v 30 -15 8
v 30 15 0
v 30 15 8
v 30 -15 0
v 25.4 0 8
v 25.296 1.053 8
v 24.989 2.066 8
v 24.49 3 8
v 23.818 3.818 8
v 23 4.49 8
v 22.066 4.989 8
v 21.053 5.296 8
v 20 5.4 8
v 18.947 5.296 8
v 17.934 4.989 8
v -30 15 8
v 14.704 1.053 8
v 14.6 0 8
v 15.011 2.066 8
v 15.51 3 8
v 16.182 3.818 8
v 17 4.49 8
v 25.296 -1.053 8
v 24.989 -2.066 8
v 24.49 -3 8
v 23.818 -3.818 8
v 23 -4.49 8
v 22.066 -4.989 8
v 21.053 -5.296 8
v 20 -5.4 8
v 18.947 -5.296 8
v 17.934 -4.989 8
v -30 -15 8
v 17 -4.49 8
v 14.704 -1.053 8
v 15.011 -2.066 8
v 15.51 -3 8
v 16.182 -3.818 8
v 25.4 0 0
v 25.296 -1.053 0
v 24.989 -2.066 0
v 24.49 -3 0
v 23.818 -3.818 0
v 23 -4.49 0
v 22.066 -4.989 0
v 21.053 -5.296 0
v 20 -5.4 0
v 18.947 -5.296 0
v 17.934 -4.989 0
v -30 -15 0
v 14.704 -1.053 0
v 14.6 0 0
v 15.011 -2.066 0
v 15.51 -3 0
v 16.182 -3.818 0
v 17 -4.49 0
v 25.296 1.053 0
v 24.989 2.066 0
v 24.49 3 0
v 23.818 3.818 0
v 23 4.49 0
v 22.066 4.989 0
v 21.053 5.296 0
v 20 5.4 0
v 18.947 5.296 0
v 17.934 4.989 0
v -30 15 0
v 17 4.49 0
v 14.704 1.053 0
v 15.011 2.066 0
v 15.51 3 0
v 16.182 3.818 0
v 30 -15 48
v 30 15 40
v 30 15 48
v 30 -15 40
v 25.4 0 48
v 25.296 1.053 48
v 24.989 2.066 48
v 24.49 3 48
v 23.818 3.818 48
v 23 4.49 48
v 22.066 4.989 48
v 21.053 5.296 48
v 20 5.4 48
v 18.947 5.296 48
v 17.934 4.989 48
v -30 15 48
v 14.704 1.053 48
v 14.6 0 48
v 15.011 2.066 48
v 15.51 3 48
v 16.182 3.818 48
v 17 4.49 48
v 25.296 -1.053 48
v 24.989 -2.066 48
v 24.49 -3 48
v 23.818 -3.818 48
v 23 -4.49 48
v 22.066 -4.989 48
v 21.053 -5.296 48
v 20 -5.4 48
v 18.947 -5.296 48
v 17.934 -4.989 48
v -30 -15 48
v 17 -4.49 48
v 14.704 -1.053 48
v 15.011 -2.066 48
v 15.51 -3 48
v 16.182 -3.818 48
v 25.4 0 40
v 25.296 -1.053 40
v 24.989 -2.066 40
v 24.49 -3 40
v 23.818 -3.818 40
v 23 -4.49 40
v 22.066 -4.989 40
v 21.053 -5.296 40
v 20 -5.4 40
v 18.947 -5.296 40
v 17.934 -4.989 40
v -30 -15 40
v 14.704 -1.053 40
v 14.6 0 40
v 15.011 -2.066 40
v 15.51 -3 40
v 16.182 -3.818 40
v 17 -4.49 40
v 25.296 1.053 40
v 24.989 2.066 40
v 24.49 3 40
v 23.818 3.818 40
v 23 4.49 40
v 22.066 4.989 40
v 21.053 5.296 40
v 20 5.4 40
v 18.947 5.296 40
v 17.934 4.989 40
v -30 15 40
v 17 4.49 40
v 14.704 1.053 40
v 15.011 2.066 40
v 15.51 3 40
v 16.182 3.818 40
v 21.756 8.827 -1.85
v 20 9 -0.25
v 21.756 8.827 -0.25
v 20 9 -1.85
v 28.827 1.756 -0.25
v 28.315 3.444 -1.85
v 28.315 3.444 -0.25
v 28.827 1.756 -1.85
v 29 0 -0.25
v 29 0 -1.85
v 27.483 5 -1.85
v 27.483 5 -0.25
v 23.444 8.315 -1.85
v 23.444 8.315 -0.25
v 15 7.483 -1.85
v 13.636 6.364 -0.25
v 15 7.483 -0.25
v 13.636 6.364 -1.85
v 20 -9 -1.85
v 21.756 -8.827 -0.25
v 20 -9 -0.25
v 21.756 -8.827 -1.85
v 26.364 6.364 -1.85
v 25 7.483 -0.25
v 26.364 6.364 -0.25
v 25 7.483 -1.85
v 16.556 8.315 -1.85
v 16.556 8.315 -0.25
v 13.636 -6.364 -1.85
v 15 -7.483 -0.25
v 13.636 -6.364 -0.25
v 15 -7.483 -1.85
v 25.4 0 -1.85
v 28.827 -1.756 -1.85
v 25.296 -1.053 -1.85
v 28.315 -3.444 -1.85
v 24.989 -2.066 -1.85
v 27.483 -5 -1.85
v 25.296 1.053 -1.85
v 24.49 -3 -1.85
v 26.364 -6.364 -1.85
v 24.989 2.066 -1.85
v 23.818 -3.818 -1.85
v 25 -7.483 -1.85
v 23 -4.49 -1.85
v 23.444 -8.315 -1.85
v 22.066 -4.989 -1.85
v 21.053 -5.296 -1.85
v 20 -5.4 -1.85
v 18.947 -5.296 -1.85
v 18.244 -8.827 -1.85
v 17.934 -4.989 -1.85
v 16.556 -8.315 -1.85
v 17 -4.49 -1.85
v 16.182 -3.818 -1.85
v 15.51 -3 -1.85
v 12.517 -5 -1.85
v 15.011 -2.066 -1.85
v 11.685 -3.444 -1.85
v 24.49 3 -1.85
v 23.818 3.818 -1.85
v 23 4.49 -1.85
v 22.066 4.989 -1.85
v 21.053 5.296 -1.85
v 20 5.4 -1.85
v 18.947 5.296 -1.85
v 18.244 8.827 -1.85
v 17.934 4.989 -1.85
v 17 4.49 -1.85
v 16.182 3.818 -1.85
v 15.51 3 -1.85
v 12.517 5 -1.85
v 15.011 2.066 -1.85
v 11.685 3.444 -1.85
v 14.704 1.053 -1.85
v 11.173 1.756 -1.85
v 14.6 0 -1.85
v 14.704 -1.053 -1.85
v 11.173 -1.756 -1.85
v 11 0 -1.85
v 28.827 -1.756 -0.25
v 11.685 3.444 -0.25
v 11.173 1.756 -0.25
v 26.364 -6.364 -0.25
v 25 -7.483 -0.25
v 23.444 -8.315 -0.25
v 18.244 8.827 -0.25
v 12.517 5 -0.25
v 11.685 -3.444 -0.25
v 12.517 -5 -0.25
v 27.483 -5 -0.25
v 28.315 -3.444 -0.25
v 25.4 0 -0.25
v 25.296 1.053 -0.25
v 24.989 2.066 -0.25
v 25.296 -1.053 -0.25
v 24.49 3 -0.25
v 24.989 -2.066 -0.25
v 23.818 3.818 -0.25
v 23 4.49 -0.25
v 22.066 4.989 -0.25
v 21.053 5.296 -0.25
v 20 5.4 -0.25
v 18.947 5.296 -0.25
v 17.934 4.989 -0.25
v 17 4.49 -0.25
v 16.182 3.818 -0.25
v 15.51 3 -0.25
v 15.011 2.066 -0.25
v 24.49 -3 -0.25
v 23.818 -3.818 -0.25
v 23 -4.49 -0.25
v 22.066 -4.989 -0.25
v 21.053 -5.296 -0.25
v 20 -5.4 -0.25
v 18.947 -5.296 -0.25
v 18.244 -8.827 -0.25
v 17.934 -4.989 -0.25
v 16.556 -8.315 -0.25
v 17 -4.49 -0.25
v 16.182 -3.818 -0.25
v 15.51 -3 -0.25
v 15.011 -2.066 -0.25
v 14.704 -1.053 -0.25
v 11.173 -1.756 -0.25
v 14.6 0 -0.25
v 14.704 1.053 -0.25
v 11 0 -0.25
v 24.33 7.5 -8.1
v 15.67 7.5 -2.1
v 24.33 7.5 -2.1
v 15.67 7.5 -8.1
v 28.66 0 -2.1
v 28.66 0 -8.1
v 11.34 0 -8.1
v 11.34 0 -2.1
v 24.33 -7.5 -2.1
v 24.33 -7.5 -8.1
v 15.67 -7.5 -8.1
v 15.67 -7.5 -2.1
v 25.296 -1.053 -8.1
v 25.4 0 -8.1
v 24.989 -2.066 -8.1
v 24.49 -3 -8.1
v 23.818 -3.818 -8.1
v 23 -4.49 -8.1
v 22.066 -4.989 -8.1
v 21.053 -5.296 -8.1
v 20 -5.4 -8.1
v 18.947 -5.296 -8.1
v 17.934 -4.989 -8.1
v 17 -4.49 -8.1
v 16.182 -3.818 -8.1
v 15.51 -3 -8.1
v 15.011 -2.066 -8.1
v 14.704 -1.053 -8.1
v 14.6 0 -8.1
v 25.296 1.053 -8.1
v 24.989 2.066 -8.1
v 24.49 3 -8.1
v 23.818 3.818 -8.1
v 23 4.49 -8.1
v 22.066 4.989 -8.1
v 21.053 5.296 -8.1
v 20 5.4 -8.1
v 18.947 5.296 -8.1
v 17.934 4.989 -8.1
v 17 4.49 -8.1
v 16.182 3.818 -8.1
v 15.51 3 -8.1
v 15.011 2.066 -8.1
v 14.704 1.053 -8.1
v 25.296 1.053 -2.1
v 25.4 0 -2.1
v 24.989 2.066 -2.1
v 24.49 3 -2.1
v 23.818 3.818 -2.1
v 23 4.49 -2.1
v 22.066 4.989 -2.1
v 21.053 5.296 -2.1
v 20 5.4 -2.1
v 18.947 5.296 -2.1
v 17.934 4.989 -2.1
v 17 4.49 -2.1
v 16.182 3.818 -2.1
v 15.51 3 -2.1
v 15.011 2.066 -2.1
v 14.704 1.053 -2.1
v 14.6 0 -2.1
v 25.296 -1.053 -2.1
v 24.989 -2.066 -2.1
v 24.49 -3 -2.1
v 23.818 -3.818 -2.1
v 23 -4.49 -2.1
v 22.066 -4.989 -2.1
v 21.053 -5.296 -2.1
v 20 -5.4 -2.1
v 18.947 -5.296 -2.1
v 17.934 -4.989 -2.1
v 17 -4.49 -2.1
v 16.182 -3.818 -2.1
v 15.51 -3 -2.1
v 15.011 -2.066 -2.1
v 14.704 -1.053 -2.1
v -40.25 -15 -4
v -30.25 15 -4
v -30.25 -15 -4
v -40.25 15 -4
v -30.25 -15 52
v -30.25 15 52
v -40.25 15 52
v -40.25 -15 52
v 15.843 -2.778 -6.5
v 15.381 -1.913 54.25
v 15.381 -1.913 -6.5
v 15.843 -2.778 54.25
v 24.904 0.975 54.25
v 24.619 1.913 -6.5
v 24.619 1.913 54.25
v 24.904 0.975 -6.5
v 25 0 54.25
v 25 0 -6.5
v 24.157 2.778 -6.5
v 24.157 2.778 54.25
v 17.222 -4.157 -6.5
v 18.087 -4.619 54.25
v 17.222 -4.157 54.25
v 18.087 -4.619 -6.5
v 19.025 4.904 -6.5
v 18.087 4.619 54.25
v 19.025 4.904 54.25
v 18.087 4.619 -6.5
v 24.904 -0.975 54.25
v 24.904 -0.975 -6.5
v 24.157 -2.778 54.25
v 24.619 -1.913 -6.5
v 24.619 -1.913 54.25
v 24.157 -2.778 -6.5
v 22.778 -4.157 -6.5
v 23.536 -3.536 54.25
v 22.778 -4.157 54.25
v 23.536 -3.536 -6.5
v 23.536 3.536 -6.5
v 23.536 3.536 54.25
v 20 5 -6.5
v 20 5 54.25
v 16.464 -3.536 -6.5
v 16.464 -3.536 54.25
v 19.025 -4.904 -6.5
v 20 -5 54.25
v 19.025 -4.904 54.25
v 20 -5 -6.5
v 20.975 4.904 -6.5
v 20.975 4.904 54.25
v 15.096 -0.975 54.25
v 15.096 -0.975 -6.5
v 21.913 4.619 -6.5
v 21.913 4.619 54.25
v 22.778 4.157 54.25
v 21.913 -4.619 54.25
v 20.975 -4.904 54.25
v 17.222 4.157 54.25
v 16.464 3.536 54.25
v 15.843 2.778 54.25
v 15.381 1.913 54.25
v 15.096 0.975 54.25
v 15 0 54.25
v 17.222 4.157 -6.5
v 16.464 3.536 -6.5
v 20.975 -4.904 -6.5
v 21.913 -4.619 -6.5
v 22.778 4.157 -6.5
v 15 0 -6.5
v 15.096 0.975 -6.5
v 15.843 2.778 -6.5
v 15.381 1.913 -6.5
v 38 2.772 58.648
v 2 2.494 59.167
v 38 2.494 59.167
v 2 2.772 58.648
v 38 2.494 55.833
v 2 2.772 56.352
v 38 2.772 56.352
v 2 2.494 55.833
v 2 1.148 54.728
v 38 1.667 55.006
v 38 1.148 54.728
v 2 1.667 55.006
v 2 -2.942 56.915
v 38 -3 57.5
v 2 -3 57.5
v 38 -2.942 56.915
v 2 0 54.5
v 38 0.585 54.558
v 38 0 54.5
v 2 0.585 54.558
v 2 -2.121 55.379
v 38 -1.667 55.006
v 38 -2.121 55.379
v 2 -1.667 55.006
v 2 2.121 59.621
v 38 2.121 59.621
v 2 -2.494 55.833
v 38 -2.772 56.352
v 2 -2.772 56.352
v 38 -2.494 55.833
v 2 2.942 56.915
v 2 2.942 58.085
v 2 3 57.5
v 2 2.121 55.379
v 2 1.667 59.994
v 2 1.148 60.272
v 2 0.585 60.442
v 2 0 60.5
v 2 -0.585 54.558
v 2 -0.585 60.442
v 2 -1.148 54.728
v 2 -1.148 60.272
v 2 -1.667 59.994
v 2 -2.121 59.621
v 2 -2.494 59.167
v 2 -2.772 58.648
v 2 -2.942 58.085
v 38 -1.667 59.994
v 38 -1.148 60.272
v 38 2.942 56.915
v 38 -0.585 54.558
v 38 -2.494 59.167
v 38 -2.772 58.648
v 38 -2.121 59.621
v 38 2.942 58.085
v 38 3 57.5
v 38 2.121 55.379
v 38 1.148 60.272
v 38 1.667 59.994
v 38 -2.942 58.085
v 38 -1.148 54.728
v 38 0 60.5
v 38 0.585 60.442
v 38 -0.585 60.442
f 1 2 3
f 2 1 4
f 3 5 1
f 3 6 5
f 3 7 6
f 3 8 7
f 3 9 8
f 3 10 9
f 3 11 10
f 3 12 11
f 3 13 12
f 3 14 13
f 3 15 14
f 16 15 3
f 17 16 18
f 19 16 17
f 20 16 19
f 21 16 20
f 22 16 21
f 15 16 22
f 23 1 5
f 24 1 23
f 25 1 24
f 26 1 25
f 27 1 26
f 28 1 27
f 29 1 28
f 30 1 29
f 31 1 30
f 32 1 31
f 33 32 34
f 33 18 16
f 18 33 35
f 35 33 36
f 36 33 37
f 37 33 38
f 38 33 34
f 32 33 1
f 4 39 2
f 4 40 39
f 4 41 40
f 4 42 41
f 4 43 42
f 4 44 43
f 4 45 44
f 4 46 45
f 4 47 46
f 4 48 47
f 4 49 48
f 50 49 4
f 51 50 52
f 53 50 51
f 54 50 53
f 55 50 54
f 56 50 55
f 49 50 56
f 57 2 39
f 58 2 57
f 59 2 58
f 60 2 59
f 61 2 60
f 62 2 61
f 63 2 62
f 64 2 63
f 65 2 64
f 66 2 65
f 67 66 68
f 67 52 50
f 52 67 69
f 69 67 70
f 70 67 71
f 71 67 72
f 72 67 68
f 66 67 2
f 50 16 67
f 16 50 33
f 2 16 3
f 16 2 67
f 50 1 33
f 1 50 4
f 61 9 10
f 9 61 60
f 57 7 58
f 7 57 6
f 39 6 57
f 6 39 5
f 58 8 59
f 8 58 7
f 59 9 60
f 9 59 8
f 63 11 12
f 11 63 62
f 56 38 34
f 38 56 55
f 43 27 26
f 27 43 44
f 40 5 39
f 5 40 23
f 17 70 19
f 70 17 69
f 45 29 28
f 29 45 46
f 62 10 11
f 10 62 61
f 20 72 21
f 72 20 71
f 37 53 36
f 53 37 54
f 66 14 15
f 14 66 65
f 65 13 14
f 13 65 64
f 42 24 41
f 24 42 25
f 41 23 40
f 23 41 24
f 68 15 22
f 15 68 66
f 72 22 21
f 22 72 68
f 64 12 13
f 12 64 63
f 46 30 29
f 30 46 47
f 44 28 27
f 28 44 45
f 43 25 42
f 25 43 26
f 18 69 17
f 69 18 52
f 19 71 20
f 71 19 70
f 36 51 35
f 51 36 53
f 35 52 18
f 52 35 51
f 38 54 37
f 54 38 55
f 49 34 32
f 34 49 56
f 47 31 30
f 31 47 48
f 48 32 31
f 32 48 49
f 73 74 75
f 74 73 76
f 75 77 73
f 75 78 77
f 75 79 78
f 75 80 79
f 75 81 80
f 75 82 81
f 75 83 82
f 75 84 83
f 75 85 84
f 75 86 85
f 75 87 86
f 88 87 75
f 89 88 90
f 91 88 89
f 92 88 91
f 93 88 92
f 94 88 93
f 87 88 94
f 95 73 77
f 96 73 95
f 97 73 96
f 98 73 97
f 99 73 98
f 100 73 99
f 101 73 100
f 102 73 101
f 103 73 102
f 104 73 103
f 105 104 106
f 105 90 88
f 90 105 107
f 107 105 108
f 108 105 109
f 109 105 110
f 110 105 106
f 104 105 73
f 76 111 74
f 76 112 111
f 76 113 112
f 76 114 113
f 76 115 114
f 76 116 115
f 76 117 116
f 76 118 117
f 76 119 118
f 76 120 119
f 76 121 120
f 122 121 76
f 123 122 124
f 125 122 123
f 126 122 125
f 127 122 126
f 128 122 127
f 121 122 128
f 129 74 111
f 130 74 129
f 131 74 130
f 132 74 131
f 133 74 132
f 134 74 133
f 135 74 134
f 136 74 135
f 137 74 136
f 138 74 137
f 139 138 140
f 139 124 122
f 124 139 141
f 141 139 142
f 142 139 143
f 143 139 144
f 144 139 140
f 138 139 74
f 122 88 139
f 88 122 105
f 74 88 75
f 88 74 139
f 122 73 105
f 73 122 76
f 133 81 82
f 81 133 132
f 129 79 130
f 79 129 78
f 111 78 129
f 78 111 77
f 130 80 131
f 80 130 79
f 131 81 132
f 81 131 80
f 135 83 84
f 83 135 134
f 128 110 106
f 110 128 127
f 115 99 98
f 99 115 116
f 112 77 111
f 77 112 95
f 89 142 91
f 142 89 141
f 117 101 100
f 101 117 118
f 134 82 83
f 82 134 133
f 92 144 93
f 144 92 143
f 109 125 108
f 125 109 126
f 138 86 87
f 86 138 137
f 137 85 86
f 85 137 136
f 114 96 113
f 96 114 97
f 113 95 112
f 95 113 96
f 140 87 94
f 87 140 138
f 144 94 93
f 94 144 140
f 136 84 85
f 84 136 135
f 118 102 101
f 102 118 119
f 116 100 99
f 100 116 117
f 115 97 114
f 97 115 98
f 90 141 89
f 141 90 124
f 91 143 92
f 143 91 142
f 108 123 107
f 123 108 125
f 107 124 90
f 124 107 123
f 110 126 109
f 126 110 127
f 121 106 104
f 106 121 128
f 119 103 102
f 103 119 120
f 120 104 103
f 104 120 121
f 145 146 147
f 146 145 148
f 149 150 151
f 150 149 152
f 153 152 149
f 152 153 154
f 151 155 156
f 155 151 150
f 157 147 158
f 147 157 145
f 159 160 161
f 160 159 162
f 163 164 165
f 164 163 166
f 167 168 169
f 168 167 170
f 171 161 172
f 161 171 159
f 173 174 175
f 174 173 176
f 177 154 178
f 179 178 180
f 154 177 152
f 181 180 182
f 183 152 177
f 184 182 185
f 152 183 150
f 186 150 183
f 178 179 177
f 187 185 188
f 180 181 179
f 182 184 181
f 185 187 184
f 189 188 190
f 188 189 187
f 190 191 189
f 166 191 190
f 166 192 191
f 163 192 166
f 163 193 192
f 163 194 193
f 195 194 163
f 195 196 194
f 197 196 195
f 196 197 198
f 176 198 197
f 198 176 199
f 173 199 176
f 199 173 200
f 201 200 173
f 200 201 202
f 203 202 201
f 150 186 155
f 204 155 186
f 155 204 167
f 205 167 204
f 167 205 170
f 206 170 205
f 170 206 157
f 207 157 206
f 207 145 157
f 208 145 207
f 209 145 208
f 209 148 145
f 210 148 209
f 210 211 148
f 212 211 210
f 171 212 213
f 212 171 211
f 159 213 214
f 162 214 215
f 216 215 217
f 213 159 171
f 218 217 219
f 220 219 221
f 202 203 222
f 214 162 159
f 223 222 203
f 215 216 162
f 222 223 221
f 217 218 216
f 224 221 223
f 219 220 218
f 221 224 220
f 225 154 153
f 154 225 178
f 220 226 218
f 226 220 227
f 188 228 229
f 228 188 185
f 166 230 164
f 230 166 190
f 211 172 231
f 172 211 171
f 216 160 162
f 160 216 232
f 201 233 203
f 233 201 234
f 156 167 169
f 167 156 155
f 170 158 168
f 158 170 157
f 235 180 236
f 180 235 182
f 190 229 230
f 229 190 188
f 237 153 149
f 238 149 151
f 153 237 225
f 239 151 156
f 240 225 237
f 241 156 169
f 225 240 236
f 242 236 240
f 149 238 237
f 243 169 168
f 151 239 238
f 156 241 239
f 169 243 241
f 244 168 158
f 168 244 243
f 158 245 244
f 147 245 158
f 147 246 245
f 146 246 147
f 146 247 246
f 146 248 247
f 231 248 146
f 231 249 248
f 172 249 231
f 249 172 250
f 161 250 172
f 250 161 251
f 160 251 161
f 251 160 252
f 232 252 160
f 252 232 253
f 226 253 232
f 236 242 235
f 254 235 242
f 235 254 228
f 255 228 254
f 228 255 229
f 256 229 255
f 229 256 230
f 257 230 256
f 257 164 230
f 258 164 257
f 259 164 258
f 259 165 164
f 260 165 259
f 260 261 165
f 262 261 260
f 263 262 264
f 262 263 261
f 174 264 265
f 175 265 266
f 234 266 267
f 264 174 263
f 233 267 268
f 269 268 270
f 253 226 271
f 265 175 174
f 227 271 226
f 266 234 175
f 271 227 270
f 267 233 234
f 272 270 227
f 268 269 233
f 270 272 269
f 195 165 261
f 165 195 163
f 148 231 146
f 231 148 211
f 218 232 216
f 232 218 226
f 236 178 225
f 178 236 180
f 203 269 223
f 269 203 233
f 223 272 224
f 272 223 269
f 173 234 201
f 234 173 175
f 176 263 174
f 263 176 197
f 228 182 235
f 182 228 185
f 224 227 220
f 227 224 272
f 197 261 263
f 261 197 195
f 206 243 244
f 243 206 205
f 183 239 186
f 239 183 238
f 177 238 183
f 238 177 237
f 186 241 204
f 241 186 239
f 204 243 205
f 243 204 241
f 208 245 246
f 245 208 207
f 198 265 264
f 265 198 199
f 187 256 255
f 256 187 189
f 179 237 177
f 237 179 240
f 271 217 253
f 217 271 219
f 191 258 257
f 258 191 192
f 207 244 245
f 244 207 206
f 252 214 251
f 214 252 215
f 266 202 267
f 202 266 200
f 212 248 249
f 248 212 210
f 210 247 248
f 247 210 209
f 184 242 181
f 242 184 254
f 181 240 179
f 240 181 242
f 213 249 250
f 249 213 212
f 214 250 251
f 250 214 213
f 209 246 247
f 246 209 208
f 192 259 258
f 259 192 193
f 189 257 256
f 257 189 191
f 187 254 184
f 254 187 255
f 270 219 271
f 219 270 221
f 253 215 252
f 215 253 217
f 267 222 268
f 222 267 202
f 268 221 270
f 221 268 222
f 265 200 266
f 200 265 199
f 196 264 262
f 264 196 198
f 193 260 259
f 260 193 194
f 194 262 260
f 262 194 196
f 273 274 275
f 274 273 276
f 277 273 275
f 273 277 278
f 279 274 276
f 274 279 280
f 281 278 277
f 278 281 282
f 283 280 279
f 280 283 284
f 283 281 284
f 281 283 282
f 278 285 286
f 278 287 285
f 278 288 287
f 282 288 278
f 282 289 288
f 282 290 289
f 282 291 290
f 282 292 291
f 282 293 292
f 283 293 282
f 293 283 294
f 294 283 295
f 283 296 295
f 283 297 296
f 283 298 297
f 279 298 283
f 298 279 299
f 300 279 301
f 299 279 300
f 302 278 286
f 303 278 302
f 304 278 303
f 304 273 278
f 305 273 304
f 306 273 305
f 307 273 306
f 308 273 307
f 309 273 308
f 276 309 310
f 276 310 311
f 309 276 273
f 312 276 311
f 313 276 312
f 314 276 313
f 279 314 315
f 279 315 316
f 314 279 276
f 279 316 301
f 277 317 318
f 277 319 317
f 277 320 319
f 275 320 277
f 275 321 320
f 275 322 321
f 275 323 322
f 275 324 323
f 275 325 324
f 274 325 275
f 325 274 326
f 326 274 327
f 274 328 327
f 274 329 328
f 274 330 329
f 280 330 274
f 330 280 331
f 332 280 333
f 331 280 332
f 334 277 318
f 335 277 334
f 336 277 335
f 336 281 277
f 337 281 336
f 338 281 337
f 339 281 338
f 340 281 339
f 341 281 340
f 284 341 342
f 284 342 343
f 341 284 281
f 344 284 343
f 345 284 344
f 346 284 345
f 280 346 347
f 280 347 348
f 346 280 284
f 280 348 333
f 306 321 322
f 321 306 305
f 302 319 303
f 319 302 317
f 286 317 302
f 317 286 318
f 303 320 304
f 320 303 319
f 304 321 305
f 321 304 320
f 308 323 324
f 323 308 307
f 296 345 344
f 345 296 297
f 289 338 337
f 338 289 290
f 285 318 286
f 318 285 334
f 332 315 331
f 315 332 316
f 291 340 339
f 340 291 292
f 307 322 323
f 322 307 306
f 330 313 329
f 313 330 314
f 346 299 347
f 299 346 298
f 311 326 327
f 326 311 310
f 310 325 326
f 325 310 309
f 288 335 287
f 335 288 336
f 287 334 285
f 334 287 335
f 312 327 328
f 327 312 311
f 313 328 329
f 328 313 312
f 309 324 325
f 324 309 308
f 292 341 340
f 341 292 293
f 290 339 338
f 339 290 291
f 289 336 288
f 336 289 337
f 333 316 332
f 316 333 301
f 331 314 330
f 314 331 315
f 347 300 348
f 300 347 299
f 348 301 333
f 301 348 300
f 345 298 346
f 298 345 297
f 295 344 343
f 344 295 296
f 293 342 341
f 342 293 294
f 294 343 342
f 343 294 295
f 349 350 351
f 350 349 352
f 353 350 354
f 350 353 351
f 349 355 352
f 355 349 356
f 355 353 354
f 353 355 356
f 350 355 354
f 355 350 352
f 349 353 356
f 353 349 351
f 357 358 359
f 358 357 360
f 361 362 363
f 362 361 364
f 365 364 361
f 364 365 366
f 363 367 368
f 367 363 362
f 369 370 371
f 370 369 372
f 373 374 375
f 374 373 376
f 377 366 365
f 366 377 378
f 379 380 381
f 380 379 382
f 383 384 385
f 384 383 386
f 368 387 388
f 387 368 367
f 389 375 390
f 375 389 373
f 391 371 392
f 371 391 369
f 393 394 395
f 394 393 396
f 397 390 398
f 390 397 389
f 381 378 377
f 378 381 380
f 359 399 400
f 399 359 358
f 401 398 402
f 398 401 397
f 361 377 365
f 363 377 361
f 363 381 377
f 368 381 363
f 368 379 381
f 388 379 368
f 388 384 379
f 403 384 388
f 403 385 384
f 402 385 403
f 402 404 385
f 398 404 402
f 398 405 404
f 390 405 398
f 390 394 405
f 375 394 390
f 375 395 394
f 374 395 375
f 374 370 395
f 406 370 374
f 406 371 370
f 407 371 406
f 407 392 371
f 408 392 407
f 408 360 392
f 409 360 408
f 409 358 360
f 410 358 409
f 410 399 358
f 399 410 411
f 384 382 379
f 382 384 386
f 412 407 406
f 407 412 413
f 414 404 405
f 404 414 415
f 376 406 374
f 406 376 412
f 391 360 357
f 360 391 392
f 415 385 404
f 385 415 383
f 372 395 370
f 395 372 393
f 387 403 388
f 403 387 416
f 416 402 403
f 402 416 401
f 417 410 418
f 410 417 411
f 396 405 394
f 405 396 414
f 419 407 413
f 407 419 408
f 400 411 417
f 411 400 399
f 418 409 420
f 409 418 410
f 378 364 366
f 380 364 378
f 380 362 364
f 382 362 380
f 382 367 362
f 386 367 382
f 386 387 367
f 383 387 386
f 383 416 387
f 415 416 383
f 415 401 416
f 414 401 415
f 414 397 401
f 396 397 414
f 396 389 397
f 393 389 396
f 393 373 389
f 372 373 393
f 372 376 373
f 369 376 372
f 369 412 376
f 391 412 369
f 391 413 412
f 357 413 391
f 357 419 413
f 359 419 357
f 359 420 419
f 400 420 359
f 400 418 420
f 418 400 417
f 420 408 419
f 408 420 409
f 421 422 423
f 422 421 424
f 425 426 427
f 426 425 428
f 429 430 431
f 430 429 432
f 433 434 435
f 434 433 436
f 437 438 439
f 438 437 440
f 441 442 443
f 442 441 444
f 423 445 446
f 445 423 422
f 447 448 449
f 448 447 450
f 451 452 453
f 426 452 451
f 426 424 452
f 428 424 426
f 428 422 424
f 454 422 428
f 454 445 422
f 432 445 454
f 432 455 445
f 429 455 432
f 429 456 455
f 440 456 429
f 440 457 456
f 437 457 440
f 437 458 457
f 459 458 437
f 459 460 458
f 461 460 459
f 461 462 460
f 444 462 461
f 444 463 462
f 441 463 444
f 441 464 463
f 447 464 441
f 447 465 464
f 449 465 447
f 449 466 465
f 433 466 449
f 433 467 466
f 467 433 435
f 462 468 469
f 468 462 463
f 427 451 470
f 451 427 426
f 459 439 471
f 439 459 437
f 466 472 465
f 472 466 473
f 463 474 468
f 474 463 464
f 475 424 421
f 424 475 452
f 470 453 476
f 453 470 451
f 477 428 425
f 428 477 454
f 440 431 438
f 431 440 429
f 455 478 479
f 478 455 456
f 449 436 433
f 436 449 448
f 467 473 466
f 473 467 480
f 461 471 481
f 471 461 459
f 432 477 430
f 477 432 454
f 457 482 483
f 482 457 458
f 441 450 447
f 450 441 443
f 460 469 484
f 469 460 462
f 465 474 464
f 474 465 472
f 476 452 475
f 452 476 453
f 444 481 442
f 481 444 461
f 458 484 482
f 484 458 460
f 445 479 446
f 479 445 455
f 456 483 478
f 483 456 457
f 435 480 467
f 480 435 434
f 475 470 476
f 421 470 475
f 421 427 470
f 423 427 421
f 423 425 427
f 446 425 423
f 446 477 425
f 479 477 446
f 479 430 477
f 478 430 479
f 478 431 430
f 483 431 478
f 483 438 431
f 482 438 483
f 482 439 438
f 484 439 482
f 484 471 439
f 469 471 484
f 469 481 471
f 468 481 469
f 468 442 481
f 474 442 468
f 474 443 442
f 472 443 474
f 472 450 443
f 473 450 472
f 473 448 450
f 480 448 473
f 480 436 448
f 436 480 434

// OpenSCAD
$fn = 32;

// ------------------------------------------------------------------------
// C clamp: throat 40 mm, screw d10
// Every part is its own module, assembly() places every instance.
// ------------------------------------------------------------------------

// --- part 1 ---
module clamp_arm() {
  difference() {
    translate([-30, -15, 0]) cube([60, 30, 8]);
    translate([20, 0, -1]) cylinder(h = 10, d = 10.8);
  }
}

// --- part 2 ---
module clamp_spine() {
  difference() {
    translate([-28, -15, 0]) cube([56, 30, 10]);
  }
}

// --- part 3 ---
module clamp_screw() {
  translate([0, 0, -30.375]) cylinder(h = 60.75, d = 10);
}

// --- part 4 ---
module clamp_washer() {
  difference() {
      translate([0, 0, 0]) cylinder(h = 1.6, d = 18);
      translate([0, 0, -1]) cylinder(h = 3.6, d = 10.8);
    }
}

// --- part 5 ---
module clamp_nut() {
  difference() {
    linear_extrude(height = 6) polygon(points = [[8.66, 0], [4.33, 7.5], [-4.33, 7.5], [-8.66, 0], [-4.33, -7.5], [4.33, -7.5]]);
    translate([0, 0, -1]) cylinder(h = 8, d = 10.8);
  }
}

// --- part 6 ---
module tommy_bar() {
  translate([0, 0, -18]) cylinder(h = 36, d = 6);
}

// --- assembly ---
module assembly() {
  color([0.80, 0.24, 0.20]) translate([0, 0, 0]) rotate([0, 0, 0]) clamp_arm();
  color([0.20, 0.45, 0.75]) translate([0, 0, 40]) rotate([0, 0, 0]) clamp_arm();
  color([0.25, 0.62, 0.32]) translate([-40.25, 0, 24]) rotate([0, 90, 0]) clamp_spine();
  color([0.92, 0.70, 0.18]) translate([20, 0, 23.875]) rotate([0, 0, 0]) clamp_screw();
  color([0.58, 0.35, 0.70]) translate([20, 0, -1.85]) rotate([0, 0, 0]) clamp_washer();
  color([0.16, 0.66, 0.66]) translate([20, 0, -8.1]) rotate([0, 0, 0]) clamp_nut();
  color([0.85, 0.48, 0.18]) translate([20, 0, 57.5]) rotate([0, 90, 0]) tommy_bar();
}

assembly();
